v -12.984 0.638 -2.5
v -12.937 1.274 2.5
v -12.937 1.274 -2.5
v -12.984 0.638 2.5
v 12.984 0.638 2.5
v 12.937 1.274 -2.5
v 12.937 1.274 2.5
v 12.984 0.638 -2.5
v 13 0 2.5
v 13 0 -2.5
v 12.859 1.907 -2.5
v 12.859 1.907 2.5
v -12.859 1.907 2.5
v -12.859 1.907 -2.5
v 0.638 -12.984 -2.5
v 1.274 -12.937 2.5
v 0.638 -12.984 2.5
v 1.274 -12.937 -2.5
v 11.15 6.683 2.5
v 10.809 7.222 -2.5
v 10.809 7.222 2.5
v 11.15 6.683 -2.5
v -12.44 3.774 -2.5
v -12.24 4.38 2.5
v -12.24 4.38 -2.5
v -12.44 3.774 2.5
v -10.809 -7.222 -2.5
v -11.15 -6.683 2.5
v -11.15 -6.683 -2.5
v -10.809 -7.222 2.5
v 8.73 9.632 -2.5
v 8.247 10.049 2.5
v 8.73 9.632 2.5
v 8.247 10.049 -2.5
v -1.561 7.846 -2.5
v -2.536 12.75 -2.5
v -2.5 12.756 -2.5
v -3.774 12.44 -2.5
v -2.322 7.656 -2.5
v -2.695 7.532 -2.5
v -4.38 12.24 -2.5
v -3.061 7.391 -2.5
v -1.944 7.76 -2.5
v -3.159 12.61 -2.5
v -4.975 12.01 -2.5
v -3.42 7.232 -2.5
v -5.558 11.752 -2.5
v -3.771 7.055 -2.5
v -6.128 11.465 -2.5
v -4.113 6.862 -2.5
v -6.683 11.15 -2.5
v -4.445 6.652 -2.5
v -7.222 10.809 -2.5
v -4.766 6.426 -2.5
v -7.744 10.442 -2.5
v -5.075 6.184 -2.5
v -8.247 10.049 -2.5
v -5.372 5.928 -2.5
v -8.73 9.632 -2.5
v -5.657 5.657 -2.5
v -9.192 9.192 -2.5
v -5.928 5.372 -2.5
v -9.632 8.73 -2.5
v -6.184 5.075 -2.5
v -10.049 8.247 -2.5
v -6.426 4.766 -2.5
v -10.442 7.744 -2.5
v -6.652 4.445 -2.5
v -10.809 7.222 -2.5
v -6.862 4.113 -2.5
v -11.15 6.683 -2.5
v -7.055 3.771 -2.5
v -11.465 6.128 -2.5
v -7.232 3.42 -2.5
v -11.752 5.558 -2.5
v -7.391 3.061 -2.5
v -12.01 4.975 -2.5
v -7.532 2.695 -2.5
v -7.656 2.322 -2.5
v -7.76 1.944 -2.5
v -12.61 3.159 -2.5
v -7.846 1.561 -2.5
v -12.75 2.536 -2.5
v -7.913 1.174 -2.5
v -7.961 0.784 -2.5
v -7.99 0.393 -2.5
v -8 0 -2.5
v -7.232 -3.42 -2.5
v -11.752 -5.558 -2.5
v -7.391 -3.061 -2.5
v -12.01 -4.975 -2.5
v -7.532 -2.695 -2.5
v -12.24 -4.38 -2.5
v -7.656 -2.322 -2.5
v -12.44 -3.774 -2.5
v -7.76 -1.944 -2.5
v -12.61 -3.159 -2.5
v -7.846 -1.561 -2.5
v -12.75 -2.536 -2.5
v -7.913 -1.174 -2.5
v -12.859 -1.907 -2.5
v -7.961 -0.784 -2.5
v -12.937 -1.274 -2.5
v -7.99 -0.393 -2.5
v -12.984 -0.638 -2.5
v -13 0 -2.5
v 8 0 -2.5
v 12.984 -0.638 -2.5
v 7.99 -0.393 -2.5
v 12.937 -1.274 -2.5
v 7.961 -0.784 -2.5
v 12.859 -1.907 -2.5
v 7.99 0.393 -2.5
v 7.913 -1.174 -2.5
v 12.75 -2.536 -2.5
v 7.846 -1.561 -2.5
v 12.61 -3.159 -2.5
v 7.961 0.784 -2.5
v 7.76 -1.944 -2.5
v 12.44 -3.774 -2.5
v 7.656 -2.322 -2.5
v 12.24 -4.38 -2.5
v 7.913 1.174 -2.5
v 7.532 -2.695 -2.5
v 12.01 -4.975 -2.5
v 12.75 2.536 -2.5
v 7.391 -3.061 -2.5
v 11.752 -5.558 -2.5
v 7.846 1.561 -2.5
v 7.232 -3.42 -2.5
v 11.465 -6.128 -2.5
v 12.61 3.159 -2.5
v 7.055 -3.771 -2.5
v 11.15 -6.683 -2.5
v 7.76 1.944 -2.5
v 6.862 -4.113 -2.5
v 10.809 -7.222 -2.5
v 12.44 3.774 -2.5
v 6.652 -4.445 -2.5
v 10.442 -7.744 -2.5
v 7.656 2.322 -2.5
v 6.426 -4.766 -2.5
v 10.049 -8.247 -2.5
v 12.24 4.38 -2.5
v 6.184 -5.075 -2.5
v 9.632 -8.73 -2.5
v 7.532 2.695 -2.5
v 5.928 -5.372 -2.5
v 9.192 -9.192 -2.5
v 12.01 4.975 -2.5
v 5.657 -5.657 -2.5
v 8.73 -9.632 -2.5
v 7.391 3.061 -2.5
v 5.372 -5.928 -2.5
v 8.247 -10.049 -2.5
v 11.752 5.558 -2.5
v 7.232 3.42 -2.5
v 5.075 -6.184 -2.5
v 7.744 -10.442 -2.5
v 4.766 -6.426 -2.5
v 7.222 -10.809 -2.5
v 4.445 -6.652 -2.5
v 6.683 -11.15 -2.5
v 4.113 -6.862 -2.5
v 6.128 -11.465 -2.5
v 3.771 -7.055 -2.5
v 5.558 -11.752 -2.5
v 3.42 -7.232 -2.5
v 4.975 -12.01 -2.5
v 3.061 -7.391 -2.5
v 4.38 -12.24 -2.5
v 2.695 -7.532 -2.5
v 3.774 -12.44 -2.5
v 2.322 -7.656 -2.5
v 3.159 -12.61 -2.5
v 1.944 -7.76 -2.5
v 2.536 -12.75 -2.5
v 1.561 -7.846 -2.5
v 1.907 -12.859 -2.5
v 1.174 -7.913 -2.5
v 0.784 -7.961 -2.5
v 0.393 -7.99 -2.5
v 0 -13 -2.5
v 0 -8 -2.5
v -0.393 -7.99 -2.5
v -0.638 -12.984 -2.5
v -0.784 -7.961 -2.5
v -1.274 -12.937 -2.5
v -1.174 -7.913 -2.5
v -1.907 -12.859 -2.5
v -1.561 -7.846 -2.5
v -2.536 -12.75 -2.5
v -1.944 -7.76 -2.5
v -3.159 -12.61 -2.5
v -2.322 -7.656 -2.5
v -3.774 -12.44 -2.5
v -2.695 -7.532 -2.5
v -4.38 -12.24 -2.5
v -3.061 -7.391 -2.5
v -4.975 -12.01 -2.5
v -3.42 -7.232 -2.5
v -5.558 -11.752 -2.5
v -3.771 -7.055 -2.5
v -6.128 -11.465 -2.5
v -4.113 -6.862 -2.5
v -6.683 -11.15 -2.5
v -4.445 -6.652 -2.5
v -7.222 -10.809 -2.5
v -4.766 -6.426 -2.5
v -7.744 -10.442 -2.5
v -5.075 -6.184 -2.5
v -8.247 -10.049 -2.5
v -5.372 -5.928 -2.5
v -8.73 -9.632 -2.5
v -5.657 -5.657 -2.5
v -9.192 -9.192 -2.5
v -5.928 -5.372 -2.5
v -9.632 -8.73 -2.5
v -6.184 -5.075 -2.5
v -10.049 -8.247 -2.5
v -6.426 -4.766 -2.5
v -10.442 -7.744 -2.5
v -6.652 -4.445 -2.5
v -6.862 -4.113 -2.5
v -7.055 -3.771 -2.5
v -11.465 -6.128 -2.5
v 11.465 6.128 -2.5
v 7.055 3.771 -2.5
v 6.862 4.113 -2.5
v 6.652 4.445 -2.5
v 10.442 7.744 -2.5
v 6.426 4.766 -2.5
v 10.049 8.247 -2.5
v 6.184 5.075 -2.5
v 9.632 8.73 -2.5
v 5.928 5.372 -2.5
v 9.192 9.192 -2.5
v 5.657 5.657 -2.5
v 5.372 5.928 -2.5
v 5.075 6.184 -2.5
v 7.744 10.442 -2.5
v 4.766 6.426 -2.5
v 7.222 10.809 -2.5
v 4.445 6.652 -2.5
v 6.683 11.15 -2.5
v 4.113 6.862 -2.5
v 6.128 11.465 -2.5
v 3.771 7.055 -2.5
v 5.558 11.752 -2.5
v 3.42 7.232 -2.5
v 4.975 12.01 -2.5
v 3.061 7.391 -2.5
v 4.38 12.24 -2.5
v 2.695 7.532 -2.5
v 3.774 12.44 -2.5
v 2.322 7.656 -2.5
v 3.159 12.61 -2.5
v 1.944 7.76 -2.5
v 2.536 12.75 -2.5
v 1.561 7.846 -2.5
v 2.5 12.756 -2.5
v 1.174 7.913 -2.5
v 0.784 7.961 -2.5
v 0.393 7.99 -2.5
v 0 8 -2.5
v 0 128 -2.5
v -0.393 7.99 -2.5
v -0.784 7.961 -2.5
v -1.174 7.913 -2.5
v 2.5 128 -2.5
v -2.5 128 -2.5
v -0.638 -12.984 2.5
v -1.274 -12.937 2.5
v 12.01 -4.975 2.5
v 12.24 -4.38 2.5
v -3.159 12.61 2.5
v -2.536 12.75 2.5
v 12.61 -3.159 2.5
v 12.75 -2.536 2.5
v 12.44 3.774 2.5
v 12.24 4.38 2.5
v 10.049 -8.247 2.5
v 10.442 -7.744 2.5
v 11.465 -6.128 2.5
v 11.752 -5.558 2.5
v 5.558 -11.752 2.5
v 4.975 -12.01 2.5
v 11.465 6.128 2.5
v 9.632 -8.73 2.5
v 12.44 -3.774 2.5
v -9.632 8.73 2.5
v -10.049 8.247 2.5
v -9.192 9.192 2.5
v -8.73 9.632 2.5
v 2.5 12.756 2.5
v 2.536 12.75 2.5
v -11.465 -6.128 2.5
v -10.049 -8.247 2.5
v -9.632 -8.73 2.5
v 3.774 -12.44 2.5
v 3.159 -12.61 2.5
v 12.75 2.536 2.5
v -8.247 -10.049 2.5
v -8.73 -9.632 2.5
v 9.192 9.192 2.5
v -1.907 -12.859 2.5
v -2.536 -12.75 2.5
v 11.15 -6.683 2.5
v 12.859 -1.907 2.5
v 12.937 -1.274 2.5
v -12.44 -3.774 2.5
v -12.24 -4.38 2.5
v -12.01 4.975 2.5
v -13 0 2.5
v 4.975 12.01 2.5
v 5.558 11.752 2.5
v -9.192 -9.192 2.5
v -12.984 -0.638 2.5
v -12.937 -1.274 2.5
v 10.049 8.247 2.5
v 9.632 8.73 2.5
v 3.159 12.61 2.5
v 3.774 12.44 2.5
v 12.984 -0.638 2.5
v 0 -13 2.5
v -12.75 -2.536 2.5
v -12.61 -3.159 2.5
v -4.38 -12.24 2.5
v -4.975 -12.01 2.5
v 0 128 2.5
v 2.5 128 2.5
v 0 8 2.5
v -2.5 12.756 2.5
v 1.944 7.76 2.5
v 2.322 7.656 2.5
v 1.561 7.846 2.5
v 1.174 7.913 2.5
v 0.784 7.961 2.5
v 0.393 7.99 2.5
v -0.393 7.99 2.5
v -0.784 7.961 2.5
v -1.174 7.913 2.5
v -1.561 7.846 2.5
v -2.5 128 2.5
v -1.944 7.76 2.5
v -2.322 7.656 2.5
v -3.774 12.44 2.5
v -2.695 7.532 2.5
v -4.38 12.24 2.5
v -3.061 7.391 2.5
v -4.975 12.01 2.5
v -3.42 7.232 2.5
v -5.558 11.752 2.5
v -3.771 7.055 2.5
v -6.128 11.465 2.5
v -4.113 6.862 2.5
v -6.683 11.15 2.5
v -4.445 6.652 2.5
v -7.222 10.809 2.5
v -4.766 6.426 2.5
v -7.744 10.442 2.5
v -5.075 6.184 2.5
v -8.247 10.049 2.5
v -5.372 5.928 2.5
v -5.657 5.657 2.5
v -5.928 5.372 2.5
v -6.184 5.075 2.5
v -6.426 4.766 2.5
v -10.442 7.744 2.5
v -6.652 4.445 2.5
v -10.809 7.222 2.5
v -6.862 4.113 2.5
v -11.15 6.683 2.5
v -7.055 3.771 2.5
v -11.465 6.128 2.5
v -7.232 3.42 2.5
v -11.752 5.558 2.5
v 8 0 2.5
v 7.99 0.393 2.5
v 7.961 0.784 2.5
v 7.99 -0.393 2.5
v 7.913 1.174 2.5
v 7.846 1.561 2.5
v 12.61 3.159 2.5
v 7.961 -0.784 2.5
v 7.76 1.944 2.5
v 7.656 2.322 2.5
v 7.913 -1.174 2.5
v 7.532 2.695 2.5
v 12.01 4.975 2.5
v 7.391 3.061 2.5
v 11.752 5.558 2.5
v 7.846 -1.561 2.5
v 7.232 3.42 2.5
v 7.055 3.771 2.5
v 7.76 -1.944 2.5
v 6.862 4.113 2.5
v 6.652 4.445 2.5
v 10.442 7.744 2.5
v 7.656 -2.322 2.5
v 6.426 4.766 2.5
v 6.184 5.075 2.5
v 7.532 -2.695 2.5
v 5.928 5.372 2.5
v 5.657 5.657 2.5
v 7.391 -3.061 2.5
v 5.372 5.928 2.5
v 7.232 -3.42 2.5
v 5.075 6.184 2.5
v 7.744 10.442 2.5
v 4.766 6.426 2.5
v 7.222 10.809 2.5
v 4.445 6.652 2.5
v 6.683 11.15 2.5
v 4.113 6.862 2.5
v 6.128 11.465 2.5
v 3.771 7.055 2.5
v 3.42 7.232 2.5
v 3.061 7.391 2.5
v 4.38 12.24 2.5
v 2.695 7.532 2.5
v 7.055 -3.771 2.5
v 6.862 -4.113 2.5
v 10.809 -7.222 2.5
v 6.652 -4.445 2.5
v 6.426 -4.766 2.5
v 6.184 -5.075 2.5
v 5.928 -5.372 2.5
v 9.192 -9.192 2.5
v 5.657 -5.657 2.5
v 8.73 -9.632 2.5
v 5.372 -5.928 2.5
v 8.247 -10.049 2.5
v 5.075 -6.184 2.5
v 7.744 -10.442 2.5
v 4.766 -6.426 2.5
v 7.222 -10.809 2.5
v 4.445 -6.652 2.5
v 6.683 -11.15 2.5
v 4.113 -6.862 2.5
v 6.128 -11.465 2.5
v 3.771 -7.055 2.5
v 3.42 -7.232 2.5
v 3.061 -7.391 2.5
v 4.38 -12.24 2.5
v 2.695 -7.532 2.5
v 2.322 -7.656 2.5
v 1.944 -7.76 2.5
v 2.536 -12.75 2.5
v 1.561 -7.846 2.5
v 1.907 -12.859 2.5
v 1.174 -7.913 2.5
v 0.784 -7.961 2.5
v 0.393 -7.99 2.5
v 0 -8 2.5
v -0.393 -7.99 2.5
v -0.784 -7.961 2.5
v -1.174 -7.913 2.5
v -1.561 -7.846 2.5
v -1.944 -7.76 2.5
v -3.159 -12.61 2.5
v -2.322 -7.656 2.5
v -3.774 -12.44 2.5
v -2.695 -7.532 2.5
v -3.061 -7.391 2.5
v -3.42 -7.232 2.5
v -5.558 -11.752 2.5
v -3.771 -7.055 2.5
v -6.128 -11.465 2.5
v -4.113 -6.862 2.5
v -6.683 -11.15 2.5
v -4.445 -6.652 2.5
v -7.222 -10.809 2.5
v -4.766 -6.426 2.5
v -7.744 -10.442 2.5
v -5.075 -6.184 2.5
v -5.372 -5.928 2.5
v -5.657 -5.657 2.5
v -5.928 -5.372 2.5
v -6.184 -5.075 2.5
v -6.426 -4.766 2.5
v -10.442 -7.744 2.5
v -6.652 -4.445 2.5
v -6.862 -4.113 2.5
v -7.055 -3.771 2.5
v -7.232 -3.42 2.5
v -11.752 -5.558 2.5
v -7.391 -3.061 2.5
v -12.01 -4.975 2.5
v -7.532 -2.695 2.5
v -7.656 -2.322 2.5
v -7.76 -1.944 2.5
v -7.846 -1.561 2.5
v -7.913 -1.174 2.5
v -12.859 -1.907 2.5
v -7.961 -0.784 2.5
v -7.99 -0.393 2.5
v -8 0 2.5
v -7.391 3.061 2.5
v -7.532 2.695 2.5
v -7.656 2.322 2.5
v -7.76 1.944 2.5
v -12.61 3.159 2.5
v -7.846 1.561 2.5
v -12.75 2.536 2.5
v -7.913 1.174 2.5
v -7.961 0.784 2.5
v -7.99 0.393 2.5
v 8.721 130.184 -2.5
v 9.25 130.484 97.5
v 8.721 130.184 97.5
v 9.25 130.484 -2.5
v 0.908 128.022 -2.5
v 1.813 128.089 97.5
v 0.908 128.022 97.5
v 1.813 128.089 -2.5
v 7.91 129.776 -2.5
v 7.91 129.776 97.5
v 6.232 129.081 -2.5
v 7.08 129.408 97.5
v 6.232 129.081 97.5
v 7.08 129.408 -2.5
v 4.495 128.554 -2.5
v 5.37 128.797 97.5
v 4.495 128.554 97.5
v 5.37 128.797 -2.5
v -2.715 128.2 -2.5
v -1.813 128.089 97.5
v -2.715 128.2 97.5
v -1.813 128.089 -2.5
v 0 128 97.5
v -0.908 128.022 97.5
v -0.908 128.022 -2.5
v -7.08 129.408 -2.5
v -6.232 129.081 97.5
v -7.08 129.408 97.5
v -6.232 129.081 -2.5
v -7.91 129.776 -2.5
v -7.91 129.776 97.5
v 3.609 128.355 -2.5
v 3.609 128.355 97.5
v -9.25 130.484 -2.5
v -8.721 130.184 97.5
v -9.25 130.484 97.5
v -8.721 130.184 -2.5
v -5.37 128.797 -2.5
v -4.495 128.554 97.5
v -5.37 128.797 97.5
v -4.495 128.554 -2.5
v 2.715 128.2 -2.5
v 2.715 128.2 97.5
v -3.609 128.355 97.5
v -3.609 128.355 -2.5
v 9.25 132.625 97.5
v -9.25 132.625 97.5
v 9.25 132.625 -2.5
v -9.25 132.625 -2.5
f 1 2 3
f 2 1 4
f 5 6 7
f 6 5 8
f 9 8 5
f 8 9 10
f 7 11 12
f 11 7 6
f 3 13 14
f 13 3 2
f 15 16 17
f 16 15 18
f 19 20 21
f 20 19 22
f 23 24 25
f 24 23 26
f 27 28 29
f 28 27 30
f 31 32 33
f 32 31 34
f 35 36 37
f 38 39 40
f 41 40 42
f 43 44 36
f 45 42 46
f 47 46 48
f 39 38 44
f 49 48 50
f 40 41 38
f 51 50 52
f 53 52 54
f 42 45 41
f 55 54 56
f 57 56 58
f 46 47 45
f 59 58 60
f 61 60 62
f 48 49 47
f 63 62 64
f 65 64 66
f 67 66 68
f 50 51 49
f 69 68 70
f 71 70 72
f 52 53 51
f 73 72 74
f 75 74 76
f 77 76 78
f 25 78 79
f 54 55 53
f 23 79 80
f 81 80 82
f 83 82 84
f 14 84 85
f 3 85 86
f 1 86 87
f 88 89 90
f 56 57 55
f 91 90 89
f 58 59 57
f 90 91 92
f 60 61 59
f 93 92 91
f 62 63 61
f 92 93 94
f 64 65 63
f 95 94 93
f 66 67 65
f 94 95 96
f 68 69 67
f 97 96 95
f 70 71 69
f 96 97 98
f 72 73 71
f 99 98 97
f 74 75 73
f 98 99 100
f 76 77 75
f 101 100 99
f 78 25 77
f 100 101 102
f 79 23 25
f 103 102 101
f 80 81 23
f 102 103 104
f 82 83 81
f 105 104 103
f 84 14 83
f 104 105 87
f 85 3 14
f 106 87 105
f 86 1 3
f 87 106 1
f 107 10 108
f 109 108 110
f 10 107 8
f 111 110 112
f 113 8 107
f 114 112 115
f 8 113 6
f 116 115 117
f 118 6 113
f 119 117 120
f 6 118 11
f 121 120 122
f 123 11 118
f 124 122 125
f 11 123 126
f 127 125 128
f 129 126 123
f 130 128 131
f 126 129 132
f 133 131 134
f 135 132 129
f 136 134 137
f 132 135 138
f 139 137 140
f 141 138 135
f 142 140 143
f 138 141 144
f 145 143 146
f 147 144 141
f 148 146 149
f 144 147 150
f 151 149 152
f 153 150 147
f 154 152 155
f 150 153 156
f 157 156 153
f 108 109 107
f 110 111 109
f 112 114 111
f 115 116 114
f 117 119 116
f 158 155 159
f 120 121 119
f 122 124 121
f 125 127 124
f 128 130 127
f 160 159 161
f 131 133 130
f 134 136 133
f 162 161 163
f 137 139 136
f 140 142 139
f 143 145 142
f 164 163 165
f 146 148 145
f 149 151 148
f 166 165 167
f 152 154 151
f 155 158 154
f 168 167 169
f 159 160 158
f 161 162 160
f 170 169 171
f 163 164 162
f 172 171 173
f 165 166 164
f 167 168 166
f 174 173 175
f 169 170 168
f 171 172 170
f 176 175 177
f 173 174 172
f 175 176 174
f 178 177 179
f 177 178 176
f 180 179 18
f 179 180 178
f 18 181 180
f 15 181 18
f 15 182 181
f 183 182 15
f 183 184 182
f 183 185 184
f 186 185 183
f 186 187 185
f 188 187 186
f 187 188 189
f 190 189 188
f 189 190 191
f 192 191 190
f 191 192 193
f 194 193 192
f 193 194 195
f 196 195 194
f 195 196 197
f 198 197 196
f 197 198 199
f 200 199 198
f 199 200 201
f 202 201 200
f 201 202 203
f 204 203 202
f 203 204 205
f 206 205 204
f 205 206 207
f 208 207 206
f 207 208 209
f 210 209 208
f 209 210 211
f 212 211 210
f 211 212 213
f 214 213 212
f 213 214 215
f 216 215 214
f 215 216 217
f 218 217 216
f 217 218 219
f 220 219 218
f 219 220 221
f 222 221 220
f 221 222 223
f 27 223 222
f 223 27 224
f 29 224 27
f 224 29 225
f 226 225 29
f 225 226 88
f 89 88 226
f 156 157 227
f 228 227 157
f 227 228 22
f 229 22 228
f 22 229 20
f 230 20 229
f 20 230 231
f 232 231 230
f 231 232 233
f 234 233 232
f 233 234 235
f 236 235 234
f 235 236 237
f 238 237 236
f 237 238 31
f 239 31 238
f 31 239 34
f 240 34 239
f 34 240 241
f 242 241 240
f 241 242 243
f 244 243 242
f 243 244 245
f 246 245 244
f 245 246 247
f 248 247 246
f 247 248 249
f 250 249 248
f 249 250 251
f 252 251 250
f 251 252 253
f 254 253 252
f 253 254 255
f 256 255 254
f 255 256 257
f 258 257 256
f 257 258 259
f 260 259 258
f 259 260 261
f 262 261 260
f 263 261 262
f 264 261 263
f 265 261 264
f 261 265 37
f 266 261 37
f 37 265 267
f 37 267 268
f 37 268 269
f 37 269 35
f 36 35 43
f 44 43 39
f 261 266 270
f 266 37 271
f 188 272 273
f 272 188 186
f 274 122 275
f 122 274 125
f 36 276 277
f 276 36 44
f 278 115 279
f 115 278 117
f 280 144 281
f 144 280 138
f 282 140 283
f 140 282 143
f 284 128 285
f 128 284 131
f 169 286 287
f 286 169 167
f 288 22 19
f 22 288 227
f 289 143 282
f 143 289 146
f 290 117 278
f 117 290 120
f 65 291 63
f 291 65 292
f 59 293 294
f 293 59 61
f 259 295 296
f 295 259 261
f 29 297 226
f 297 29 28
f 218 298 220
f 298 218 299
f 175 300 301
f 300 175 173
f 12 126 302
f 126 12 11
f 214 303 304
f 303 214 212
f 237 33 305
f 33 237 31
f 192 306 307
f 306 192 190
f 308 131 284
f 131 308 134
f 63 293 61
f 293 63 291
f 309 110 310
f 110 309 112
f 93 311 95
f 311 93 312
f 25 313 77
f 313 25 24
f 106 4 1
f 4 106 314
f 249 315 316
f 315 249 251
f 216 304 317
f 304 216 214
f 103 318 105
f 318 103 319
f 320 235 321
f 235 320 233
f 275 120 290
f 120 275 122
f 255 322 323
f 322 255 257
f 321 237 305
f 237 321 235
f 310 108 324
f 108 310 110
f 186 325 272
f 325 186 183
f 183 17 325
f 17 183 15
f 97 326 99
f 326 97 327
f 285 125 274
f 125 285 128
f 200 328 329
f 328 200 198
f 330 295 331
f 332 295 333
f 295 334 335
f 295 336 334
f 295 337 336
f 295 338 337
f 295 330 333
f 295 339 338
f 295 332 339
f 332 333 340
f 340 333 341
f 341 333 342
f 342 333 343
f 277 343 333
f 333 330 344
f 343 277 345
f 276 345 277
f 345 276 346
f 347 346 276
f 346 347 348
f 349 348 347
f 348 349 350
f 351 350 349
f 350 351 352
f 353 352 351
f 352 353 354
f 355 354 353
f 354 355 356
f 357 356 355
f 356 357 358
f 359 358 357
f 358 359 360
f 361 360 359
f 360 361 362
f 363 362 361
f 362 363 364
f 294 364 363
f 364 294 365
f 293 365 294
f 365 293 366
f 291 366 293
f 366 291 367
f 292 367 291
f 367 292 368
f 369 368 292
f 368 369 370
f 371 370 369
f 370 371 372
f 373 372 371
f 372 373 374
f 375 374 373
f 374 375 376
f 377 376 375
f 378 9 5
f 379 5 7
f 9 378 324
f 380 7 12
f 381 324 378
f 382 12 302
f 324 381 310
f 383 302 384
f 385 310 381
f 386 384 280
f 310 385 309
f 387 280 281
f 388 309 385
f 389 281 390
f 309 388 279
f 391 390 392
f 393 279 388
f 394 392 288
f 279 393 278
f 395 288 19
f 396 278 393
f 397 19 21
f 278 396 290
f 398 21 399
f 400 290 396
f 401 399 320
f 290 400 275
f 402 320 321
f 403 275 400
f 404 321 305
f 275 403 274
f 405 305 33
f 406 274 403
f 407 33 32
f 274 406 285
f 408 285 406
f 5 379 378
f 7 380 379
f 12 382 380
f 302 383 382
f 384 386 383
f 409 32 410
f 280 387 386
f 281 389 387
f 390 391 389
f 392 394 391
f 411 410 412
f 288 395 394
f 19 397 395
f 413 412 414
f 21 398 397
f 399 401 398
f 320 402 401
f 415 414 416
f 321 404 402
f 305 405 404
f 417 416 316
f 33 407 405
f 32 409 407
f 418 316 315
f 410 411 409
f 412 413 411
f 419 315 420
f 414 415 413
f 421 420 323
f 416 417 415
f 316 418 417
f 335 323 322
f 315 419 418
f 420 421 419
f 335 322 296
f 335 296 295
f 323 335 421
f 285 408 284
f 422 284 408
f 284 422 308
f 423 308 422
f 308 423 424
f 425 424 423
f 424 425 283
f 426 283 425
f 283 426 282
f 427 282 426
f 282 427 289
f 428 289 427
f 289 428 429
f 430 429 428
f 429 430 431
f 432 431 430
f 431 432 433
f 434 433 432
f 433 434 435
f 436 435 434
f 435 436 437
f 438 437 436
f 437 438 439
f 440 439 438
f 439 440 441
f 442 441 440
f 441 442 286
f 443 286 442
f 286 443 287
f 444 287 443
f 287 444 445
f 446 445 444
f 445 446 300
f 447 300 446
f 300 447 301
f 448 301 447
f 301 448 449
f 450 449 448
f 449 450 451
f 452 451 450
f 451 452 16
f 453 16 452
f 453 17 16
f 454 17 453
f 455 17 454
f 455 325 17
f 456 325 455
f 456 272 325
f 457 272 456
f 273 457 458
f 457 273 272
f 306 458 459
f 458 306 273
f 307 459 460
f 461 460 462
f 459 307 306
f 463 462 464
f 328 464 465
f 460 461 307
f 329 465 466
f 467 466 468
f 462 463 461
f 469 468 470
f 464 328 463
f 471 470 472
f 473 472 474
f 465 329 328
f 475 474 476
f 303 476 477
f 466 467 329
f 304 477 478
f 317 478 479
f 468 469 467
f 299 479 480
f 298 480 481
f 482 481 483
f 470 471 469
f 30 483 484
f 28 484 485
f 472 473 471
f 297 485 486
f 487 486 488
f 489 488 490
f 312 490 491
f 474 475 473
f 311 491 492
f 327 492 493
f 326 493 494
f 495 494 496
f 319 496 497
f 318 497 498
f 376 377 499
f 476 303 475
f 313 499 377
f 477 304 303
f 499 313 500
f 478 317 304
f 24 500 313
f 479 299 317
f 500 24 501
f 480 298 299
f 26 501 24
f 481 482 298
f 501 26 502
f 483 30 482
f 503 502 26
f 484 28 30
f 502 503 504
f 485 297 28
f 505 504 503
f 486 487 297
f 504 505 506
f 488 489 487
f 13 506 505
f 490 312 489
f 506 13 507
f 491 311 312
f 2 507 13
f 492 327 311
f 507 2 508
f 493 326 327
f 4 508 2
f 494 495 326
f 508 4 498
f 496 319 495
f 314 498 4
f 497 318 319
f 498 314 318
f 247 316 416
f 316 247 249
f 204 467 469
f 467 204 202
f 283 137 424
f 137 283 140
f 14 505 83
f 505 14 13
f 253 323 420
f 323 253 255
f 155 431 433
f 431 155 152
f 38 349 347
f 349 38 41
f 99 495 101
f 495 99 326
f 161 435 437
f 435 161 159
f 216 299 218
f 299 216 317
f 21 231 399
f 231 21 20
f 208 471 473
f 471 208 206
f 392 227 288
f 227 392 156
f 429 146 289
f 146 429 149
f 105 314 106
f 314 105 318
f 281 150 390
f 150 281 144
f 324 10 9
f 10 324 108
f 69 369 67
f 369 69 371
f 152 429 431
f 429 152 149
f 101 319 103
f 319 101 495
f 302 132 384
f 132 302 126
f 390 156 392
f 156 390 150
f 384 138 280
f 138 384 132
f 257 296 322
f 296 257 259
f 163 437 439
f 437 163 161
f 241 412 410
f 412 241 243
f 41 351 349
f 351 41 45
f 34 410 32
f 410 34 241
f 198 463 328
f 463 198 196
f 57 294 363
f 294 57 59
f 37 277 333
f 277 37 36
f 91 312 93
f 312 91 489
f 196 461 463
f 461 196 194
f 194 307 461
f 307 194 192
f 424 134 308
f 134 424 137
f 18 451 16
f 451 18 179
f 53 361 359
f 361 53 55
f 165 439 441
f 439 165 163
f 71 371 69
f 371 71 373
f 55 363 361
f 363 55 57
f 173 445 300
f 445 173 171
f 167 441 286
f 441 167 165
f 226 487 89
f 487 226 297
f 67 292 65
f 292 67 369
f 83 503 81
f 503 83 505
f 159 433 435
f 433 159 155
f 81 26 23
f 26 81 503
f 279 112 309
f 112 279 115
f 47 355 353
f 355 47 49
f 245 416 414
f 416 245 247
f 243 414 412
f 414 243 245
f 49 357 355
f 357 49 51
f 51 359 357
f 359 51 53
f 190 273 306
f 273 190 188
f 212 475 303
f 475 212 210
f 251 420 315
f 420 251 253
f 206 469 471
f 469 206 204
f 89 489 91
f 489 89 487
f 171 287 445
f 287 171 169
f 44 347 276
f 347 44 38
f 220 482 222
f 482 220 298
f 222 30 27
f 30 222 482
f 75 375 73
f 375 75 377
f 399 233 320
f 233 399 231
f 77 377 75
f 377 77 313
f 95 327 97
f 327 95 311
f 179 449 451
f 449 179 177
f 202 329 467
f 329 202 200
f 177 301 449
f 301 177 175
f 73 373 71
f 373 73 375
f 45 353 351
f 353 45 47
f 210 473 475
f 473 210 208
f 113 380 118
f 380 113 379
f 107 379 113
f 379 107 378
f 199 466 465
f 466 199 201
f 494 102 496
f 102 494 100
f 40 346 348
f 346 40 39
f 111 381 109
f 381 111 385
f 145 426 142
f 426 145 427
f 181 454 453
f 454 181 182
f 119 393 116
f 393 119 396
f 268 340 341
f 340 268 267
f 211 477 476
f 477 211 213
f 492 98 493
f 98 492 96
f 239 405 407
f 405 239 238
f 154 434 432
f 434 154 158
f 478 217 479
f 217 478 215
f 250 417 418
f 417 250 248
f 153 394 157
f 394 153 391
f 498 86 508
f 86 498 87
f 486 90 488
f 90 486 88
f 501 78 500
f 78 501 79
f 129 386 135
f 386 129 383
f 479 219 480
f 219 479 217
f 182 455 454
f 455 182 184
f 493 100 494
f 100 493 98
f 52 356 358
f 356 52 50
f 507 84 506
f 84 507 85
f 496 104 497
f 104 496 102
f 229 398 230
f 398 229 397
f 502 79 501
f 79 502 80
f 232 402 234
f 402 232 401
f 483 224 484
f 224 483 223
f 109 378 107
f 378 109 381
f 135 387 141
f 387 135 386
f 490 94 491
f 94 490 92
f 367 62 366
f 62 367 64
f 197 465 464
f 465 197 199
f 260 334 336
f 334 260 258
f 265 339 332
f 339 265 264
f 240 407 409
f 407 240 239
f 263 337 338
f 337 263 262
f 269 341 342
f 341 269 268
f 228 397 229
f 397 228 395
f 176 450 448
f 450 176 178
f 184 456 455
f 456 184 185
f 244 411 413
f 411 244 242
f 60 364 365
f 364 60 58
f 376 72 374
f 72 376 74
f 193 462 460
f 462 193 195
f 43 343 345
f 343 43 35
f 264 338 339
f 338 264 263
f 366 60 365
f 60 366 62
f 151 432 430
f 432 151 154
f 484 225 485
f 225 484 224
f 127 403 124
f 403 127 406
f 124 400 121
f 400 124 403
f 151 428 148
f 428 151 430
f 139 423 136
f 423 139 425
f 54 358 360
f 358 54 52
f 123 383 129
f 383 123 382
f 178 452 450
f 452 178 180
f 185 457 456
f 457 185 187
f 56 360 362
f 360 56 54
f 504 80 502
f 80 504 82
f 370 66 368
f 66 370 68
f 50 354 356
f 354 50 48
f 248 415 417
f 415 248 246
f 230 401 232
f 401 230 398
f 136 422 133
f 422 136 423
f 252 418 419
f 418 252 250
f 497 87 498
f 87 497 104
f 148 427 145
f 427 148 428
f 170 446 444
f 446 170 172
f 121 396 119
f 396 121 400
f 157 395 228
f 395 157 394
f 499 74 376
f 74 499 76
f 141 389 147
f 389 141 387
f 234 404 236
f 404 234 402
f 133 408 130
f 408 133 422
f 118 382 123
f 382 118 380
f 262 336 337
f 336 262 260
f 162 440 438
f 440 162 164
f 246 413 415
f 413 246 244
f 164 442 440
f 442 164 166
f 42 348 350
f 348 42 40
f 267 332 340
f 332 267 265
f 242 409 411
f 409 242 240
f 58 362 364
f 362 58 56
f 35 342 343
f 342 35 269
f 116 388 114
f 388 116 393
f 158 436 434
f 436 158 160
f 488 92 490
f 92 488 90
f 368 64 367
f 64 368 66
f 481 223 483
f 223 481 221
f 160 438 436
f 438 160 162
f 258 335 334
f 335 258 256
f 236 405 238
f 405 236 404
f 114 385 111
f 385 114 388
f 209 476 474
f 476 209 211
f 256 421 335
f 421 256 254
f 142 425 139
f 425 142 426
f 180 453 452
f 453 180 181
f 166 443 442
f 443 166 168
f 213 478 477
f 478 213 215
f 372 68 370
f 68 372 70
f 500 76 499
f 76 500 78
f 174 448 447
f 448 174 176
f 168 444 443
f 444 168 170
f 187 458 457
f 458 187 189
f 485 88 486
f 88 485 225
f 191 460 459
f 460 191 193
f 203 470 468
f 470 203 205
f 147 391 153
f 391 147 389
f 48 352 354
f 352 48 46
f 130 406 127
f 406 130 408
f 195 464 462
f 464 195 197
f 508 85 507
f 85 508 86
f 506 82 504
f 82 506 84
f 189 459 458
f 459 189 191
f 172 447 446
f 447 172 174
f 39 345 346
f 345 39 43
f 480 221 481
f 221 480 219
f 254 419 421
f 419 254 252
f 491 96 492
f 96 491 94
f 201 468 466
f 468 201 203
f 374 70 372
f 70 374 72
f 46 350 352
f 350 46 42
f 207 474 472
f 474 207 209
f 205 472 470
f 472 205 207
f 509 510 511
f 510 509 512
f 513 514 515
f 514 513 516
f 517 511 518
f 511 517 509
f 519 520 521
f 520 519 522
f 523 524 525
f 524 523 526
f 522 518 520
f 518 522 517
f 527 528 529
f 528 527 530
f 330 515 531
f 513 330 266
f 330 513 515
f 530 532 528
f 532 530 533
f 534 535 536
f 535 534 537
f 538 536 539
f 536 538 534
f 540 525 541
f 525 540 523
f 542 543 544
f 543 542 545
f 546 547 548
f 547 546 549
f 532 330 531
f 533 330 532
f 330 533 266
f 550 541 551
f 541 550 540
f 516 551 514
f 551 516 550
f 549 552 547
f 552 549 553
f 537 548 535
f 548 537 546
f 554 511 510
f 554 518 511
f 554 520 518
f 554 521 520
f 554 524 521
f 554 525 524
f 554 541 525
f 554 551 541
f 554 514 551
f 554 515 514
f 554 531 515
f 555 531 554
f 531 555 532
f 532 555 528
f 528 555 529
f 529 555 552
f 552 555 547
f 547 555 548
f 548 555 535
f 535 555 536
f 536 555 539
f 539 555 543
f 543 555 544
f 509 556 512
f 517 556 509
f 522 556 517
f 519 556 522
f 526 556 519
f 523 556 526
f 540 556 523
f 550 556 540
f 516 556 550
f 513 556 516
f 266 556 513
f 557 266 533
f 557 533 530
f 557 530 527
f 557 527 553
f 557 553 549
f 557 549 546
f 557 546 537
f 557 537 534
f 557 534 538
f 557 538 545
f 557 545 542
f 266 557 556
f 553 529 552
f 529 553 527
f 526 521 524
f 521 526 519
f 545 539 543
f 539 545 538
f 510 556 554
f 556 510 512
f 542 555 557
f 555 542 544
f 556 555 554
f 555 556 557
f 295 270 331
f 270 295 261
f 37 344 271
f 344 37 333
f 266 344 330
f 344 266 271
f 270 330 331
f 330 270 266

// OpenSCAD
// unit = mm

$fn = 128;

module cylinderhole(h,r,t,center = true) {
    difference() {
        cylinder(h=h, r=r+t, center = center);
        cylinder(h=h+1, r=r, center = center);
    }
}

module cylinderhollow(h,r,t,center = true) {
    difference() {
        cylinder(h=h, r=r, center = center);
        cylinder(h=h+1, r=r-t, center = center);
    }
}

module Hook(diameter,thickness) {
    cylinderhole(h=thickness, r=diameter/2, t = thickness);
}

module Stick(diameter,thickness,length) {
    translate([0-thickness/2,diameter/2,0-thickness/2]) {
        cube([thickness,length,thickness]);
    };
}

module RollHolder(diameter,thickness,length,tpLength, innerRollDiameter) {
    translate([0,length+thickness,0]) {
        translate([0,diameter/2,0]) {
            translate([0,innerRollDiameter/2-thickness,-thickness/2]) {
                intersection() {
                    cylinderhollow(h=tpLength, r=innerRollDiameter/2, t = thickness, center = false);
                    cropX = innerRollDiameter/2;
                    translate([0-cropX/2,0-innerRollDiameter/2,0]) {
                        #cube([cropX,innerRollDiameter/8,tpLength]);
                    }
                    //rotate(90-90) square(innerRollDiameter/2);
                }
                
                
            }
        }
    }
}

module Main(hookRadius=16,thickness=5,length=120,rollDiameter=37) {
    Hook(hookRadius,thickness);
    Stick(hookRadius,thickness,length);
    RollHolder(hookRadius,thickness,length,100,rollDiameter);
    
}

Main();
